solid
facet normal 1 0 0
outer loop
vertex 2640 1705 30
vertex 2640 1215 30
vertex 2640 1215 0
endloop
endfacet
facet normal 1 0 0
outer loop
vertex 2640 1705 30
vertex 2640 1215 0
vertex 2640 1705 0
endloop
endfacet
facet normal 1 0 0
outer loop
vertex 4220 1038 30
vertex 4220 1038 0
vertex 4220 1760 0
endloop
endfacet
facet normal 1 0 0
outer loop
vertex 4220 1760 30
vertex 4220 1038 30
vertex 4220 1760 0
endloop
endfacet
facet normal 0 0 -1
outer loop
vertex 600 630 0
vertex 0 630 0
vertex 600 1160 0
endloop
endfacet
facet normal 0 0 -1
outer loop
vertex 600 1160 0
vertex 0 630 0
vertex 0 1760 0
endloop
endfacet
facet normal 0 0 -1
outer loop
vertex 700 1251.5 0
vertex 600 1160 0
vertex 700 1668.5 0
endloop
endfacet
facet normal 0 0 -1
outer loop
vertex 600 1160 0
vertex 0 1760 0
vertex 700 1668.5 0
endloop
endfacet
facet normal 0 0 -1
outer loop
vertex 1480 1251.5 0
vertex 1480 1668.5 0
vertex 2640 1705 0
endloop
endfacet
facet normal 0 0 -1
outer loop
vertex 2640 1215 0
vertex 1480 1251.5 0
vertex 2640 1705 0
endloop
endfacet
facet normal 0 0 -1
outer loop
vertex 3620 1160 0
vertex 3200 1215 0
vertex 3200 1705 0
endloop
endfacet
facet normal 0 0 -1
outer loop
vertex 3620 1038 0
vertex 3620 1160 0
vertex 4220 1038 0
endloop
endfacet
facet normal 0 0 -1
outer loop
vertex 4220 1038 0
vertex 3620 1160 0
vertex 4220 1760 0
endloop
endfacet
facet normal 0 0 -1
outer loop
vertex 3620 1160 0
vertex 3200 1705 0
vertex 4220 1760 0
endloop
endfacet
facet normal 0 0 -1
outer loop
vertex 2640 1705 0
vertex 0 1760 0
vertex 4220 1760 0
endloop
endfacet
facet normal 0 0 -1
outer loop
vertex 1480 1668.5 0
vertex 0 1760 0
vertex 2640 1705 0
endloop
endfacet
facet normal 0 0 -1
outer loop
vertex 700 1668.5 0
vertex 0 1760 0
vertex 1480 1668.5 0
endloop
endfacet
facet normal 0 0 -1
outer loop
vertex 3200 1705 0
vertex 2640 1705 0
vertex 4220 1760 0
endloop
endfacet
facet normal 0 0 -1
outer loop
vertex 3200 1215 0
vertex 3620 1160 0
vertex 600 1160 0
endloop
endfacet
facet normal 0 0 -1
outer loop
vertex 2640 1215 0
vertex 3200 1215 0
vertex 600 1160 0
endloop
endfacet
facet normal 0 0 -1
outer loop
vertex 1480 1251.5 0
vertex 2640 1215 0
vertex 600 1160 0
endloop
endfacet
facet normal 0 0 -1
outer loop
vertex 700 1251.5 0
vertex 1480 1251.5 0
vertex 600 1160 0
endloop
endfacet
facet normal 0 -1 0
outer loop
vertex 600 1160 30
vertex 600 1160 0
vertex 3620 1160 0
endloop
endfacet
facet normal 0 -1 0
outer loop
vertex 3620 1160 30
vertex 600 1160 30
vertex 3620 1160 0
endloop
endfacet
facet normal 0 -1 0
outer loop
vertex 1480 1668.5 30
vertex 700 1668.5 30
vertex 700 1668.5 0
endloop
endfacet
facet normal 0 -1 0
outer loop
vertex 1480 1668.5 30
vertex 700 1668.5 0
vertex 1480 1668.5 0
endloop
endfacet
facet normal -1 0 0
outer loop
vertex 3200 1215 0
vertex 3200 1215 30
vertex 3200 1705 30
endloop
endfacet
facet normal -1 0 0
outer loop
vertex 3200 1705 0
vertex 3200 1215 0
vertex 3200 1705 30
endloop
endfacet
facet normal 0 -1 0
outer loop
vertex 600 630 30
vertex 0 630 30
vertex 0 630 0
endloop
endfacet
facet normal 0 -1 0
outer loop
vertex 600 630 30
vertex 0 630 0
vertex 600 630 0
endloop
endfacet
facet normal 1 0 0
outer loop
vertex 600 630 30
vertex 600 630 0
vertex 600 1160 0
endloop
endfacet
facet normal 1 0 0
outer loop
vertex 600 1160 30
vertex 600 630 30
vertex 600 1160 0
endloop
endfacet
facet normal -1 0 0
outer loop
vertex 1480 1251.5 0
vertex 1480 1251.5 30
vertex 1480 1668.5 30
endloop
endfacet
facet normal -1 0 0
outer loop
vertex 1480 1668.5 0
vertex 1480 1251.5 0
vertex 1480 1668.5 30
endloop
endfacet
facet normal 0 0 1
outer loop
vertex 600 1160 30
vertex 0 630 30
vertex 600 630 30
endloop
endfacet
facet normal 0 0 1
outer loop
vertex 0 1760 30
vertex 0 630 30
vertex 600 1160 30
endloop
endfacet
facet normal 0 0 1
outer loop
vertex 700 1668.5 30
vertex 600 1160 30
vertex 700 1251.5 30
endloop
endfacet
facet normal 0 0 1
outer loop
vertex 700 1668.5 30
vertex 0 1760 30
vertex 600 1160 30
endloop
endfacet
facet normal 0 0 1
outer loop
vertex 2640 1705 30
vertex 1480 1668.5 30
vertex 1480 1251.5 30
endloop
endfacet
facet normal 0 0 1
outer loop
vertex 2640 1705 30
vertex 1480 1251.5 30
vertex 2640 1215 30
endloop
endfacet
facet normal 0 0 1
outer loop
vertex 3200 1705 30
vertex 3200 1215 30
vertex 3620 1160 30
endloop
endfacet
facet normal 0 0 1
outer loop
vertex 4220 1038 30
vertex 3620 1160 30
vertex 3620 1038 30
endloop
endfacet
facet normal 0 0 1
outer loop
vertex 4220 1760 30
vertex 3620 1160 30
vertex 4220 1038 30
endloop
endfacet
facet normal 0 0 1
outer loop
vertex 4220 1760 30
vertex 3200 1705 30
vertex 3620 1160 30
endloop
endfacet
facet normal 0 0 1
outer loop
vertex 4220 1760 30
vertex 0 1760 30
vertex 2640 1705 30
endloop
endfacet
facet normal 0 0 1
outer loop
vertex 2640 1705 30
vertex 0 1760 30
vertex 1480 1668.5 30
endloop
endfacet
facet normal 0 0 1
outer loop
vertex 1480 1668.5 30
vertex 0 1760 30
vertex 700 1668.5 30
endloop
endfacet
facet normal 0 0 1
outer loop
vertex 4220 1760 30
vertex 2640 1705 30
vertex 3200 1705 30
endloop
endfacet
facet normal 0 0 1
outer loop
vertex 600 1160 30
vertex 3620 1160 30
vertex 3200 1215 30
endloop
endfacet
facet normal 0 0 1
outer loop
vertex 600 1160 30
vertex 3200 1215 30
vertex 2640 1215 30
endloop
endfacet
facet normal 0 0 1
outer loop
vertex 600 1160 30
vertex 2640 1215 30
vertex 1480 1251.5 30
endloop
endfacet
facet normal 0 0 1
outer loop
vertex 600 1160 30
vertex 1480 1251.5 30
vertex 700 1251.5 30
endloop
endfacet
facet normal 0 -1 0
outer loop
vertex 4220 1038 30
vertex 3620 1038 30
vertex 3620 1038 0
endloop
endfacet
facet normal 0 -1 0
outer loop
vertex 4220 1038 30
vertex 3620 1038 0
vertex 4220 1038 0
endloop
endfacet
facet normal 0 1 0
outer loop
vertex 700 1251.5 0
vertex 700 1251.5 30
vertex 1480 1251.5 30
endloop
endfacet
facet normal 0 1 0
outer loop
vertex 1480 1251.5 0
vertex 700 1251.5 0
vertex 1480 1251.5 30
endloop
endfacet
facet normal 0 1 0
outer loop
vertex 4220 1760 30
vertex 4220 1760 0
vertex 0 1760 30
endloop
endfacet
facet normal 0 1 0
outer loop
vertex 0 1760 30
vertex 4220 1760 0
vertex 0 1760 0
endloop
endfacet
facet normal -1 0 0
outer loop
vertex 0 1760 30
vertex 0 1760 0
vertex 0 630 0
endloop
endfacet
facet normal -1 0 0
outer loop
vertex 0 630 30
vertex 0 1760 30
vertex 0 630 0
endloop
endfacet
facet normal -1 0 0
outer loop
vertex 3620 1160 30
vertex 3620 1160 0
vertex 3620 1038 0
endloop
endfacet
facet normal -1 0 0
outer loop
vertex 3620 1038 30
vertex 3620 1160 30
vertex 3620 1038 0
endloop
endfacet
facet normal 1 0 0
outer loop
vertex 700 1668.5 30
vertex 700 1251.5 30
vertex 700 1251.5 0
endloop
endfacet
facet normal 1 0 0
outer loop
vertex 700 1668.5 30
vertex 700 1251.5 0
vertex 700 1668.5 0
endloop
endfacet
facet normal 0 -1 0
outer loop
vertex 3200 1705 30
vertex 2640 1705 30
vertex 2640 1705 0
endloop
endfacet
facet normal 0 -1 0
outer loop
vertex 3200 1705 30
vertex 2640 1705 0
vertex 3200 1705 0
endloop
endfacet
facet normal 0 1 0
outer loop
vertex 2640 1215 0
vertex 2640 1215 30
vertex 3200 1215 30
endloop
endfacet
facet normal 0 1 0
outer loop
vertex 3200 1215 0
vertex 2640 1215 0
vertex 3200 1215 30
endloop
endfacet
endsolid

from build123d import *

# Parameters (mm, degrees)
F1_DEPTH = 30
F2_W     = 780
F2_H     = 417
F3_DEPTH = 30
F4_W     = 560
F4_H     = 490
F5_DEPTH = 30
F6_W     = 600
F6_H     = 630
F7_DEPTH = 30
F8_W     = 600
F8_H     = 1038
F9_DEPTH = 30


with BuildPart() as f1:
    # F0 (on Top) → F1 (new body)
    with BuildSketch(Plane.XY):
        Polygon((0, 1760), (0, 0), (600, 0), (600, 1160), (3620, 1160), (3620, 0), (4220, 0), (4220, 1760), align=None)
    extrude(amount=F1_DEPTH)

    # F2 (on face) → F3 (cut, through all)
    with BuildSketch(Plane.XY.offset(30)):
        with Locations((1090, 1460)):
            Rectangle(F2_W, F2_H)
    extrude(amount=-F3_DEPTH, mode=Mode.SUBTRACT)

    # F4 (on face) → F5 (cut, through all)
    with BuildSketch(Plane.XY.offset(30)):
        with Locations((2920, 1460)):
            Rectangle(F4_W, F4_H)
    extrude(amount=-F5_DEPTH, mode=Mode.SUBTRACT)

    # F6 (on face) → F7 (cut, through all)
    with BuildSketch(Plane.XY.offset(30)):
        with Locations((300, 315)):
            Rectangle(F6_W, F6_H)
    extrude(amount=-F7_DEPTH, mode=Mode.SUBTRACT)

    # F8 (on face) → F9 (cut, through all)
    with BuildSketch(Plane.XY.offset(30)):
        with Locations((3920, 519)):
            Rectangle(F8_W, F8_H)
    extrude(amount=-F9_DEPTH, mode=Mode.SUBTRACT)


solid = f1.part
